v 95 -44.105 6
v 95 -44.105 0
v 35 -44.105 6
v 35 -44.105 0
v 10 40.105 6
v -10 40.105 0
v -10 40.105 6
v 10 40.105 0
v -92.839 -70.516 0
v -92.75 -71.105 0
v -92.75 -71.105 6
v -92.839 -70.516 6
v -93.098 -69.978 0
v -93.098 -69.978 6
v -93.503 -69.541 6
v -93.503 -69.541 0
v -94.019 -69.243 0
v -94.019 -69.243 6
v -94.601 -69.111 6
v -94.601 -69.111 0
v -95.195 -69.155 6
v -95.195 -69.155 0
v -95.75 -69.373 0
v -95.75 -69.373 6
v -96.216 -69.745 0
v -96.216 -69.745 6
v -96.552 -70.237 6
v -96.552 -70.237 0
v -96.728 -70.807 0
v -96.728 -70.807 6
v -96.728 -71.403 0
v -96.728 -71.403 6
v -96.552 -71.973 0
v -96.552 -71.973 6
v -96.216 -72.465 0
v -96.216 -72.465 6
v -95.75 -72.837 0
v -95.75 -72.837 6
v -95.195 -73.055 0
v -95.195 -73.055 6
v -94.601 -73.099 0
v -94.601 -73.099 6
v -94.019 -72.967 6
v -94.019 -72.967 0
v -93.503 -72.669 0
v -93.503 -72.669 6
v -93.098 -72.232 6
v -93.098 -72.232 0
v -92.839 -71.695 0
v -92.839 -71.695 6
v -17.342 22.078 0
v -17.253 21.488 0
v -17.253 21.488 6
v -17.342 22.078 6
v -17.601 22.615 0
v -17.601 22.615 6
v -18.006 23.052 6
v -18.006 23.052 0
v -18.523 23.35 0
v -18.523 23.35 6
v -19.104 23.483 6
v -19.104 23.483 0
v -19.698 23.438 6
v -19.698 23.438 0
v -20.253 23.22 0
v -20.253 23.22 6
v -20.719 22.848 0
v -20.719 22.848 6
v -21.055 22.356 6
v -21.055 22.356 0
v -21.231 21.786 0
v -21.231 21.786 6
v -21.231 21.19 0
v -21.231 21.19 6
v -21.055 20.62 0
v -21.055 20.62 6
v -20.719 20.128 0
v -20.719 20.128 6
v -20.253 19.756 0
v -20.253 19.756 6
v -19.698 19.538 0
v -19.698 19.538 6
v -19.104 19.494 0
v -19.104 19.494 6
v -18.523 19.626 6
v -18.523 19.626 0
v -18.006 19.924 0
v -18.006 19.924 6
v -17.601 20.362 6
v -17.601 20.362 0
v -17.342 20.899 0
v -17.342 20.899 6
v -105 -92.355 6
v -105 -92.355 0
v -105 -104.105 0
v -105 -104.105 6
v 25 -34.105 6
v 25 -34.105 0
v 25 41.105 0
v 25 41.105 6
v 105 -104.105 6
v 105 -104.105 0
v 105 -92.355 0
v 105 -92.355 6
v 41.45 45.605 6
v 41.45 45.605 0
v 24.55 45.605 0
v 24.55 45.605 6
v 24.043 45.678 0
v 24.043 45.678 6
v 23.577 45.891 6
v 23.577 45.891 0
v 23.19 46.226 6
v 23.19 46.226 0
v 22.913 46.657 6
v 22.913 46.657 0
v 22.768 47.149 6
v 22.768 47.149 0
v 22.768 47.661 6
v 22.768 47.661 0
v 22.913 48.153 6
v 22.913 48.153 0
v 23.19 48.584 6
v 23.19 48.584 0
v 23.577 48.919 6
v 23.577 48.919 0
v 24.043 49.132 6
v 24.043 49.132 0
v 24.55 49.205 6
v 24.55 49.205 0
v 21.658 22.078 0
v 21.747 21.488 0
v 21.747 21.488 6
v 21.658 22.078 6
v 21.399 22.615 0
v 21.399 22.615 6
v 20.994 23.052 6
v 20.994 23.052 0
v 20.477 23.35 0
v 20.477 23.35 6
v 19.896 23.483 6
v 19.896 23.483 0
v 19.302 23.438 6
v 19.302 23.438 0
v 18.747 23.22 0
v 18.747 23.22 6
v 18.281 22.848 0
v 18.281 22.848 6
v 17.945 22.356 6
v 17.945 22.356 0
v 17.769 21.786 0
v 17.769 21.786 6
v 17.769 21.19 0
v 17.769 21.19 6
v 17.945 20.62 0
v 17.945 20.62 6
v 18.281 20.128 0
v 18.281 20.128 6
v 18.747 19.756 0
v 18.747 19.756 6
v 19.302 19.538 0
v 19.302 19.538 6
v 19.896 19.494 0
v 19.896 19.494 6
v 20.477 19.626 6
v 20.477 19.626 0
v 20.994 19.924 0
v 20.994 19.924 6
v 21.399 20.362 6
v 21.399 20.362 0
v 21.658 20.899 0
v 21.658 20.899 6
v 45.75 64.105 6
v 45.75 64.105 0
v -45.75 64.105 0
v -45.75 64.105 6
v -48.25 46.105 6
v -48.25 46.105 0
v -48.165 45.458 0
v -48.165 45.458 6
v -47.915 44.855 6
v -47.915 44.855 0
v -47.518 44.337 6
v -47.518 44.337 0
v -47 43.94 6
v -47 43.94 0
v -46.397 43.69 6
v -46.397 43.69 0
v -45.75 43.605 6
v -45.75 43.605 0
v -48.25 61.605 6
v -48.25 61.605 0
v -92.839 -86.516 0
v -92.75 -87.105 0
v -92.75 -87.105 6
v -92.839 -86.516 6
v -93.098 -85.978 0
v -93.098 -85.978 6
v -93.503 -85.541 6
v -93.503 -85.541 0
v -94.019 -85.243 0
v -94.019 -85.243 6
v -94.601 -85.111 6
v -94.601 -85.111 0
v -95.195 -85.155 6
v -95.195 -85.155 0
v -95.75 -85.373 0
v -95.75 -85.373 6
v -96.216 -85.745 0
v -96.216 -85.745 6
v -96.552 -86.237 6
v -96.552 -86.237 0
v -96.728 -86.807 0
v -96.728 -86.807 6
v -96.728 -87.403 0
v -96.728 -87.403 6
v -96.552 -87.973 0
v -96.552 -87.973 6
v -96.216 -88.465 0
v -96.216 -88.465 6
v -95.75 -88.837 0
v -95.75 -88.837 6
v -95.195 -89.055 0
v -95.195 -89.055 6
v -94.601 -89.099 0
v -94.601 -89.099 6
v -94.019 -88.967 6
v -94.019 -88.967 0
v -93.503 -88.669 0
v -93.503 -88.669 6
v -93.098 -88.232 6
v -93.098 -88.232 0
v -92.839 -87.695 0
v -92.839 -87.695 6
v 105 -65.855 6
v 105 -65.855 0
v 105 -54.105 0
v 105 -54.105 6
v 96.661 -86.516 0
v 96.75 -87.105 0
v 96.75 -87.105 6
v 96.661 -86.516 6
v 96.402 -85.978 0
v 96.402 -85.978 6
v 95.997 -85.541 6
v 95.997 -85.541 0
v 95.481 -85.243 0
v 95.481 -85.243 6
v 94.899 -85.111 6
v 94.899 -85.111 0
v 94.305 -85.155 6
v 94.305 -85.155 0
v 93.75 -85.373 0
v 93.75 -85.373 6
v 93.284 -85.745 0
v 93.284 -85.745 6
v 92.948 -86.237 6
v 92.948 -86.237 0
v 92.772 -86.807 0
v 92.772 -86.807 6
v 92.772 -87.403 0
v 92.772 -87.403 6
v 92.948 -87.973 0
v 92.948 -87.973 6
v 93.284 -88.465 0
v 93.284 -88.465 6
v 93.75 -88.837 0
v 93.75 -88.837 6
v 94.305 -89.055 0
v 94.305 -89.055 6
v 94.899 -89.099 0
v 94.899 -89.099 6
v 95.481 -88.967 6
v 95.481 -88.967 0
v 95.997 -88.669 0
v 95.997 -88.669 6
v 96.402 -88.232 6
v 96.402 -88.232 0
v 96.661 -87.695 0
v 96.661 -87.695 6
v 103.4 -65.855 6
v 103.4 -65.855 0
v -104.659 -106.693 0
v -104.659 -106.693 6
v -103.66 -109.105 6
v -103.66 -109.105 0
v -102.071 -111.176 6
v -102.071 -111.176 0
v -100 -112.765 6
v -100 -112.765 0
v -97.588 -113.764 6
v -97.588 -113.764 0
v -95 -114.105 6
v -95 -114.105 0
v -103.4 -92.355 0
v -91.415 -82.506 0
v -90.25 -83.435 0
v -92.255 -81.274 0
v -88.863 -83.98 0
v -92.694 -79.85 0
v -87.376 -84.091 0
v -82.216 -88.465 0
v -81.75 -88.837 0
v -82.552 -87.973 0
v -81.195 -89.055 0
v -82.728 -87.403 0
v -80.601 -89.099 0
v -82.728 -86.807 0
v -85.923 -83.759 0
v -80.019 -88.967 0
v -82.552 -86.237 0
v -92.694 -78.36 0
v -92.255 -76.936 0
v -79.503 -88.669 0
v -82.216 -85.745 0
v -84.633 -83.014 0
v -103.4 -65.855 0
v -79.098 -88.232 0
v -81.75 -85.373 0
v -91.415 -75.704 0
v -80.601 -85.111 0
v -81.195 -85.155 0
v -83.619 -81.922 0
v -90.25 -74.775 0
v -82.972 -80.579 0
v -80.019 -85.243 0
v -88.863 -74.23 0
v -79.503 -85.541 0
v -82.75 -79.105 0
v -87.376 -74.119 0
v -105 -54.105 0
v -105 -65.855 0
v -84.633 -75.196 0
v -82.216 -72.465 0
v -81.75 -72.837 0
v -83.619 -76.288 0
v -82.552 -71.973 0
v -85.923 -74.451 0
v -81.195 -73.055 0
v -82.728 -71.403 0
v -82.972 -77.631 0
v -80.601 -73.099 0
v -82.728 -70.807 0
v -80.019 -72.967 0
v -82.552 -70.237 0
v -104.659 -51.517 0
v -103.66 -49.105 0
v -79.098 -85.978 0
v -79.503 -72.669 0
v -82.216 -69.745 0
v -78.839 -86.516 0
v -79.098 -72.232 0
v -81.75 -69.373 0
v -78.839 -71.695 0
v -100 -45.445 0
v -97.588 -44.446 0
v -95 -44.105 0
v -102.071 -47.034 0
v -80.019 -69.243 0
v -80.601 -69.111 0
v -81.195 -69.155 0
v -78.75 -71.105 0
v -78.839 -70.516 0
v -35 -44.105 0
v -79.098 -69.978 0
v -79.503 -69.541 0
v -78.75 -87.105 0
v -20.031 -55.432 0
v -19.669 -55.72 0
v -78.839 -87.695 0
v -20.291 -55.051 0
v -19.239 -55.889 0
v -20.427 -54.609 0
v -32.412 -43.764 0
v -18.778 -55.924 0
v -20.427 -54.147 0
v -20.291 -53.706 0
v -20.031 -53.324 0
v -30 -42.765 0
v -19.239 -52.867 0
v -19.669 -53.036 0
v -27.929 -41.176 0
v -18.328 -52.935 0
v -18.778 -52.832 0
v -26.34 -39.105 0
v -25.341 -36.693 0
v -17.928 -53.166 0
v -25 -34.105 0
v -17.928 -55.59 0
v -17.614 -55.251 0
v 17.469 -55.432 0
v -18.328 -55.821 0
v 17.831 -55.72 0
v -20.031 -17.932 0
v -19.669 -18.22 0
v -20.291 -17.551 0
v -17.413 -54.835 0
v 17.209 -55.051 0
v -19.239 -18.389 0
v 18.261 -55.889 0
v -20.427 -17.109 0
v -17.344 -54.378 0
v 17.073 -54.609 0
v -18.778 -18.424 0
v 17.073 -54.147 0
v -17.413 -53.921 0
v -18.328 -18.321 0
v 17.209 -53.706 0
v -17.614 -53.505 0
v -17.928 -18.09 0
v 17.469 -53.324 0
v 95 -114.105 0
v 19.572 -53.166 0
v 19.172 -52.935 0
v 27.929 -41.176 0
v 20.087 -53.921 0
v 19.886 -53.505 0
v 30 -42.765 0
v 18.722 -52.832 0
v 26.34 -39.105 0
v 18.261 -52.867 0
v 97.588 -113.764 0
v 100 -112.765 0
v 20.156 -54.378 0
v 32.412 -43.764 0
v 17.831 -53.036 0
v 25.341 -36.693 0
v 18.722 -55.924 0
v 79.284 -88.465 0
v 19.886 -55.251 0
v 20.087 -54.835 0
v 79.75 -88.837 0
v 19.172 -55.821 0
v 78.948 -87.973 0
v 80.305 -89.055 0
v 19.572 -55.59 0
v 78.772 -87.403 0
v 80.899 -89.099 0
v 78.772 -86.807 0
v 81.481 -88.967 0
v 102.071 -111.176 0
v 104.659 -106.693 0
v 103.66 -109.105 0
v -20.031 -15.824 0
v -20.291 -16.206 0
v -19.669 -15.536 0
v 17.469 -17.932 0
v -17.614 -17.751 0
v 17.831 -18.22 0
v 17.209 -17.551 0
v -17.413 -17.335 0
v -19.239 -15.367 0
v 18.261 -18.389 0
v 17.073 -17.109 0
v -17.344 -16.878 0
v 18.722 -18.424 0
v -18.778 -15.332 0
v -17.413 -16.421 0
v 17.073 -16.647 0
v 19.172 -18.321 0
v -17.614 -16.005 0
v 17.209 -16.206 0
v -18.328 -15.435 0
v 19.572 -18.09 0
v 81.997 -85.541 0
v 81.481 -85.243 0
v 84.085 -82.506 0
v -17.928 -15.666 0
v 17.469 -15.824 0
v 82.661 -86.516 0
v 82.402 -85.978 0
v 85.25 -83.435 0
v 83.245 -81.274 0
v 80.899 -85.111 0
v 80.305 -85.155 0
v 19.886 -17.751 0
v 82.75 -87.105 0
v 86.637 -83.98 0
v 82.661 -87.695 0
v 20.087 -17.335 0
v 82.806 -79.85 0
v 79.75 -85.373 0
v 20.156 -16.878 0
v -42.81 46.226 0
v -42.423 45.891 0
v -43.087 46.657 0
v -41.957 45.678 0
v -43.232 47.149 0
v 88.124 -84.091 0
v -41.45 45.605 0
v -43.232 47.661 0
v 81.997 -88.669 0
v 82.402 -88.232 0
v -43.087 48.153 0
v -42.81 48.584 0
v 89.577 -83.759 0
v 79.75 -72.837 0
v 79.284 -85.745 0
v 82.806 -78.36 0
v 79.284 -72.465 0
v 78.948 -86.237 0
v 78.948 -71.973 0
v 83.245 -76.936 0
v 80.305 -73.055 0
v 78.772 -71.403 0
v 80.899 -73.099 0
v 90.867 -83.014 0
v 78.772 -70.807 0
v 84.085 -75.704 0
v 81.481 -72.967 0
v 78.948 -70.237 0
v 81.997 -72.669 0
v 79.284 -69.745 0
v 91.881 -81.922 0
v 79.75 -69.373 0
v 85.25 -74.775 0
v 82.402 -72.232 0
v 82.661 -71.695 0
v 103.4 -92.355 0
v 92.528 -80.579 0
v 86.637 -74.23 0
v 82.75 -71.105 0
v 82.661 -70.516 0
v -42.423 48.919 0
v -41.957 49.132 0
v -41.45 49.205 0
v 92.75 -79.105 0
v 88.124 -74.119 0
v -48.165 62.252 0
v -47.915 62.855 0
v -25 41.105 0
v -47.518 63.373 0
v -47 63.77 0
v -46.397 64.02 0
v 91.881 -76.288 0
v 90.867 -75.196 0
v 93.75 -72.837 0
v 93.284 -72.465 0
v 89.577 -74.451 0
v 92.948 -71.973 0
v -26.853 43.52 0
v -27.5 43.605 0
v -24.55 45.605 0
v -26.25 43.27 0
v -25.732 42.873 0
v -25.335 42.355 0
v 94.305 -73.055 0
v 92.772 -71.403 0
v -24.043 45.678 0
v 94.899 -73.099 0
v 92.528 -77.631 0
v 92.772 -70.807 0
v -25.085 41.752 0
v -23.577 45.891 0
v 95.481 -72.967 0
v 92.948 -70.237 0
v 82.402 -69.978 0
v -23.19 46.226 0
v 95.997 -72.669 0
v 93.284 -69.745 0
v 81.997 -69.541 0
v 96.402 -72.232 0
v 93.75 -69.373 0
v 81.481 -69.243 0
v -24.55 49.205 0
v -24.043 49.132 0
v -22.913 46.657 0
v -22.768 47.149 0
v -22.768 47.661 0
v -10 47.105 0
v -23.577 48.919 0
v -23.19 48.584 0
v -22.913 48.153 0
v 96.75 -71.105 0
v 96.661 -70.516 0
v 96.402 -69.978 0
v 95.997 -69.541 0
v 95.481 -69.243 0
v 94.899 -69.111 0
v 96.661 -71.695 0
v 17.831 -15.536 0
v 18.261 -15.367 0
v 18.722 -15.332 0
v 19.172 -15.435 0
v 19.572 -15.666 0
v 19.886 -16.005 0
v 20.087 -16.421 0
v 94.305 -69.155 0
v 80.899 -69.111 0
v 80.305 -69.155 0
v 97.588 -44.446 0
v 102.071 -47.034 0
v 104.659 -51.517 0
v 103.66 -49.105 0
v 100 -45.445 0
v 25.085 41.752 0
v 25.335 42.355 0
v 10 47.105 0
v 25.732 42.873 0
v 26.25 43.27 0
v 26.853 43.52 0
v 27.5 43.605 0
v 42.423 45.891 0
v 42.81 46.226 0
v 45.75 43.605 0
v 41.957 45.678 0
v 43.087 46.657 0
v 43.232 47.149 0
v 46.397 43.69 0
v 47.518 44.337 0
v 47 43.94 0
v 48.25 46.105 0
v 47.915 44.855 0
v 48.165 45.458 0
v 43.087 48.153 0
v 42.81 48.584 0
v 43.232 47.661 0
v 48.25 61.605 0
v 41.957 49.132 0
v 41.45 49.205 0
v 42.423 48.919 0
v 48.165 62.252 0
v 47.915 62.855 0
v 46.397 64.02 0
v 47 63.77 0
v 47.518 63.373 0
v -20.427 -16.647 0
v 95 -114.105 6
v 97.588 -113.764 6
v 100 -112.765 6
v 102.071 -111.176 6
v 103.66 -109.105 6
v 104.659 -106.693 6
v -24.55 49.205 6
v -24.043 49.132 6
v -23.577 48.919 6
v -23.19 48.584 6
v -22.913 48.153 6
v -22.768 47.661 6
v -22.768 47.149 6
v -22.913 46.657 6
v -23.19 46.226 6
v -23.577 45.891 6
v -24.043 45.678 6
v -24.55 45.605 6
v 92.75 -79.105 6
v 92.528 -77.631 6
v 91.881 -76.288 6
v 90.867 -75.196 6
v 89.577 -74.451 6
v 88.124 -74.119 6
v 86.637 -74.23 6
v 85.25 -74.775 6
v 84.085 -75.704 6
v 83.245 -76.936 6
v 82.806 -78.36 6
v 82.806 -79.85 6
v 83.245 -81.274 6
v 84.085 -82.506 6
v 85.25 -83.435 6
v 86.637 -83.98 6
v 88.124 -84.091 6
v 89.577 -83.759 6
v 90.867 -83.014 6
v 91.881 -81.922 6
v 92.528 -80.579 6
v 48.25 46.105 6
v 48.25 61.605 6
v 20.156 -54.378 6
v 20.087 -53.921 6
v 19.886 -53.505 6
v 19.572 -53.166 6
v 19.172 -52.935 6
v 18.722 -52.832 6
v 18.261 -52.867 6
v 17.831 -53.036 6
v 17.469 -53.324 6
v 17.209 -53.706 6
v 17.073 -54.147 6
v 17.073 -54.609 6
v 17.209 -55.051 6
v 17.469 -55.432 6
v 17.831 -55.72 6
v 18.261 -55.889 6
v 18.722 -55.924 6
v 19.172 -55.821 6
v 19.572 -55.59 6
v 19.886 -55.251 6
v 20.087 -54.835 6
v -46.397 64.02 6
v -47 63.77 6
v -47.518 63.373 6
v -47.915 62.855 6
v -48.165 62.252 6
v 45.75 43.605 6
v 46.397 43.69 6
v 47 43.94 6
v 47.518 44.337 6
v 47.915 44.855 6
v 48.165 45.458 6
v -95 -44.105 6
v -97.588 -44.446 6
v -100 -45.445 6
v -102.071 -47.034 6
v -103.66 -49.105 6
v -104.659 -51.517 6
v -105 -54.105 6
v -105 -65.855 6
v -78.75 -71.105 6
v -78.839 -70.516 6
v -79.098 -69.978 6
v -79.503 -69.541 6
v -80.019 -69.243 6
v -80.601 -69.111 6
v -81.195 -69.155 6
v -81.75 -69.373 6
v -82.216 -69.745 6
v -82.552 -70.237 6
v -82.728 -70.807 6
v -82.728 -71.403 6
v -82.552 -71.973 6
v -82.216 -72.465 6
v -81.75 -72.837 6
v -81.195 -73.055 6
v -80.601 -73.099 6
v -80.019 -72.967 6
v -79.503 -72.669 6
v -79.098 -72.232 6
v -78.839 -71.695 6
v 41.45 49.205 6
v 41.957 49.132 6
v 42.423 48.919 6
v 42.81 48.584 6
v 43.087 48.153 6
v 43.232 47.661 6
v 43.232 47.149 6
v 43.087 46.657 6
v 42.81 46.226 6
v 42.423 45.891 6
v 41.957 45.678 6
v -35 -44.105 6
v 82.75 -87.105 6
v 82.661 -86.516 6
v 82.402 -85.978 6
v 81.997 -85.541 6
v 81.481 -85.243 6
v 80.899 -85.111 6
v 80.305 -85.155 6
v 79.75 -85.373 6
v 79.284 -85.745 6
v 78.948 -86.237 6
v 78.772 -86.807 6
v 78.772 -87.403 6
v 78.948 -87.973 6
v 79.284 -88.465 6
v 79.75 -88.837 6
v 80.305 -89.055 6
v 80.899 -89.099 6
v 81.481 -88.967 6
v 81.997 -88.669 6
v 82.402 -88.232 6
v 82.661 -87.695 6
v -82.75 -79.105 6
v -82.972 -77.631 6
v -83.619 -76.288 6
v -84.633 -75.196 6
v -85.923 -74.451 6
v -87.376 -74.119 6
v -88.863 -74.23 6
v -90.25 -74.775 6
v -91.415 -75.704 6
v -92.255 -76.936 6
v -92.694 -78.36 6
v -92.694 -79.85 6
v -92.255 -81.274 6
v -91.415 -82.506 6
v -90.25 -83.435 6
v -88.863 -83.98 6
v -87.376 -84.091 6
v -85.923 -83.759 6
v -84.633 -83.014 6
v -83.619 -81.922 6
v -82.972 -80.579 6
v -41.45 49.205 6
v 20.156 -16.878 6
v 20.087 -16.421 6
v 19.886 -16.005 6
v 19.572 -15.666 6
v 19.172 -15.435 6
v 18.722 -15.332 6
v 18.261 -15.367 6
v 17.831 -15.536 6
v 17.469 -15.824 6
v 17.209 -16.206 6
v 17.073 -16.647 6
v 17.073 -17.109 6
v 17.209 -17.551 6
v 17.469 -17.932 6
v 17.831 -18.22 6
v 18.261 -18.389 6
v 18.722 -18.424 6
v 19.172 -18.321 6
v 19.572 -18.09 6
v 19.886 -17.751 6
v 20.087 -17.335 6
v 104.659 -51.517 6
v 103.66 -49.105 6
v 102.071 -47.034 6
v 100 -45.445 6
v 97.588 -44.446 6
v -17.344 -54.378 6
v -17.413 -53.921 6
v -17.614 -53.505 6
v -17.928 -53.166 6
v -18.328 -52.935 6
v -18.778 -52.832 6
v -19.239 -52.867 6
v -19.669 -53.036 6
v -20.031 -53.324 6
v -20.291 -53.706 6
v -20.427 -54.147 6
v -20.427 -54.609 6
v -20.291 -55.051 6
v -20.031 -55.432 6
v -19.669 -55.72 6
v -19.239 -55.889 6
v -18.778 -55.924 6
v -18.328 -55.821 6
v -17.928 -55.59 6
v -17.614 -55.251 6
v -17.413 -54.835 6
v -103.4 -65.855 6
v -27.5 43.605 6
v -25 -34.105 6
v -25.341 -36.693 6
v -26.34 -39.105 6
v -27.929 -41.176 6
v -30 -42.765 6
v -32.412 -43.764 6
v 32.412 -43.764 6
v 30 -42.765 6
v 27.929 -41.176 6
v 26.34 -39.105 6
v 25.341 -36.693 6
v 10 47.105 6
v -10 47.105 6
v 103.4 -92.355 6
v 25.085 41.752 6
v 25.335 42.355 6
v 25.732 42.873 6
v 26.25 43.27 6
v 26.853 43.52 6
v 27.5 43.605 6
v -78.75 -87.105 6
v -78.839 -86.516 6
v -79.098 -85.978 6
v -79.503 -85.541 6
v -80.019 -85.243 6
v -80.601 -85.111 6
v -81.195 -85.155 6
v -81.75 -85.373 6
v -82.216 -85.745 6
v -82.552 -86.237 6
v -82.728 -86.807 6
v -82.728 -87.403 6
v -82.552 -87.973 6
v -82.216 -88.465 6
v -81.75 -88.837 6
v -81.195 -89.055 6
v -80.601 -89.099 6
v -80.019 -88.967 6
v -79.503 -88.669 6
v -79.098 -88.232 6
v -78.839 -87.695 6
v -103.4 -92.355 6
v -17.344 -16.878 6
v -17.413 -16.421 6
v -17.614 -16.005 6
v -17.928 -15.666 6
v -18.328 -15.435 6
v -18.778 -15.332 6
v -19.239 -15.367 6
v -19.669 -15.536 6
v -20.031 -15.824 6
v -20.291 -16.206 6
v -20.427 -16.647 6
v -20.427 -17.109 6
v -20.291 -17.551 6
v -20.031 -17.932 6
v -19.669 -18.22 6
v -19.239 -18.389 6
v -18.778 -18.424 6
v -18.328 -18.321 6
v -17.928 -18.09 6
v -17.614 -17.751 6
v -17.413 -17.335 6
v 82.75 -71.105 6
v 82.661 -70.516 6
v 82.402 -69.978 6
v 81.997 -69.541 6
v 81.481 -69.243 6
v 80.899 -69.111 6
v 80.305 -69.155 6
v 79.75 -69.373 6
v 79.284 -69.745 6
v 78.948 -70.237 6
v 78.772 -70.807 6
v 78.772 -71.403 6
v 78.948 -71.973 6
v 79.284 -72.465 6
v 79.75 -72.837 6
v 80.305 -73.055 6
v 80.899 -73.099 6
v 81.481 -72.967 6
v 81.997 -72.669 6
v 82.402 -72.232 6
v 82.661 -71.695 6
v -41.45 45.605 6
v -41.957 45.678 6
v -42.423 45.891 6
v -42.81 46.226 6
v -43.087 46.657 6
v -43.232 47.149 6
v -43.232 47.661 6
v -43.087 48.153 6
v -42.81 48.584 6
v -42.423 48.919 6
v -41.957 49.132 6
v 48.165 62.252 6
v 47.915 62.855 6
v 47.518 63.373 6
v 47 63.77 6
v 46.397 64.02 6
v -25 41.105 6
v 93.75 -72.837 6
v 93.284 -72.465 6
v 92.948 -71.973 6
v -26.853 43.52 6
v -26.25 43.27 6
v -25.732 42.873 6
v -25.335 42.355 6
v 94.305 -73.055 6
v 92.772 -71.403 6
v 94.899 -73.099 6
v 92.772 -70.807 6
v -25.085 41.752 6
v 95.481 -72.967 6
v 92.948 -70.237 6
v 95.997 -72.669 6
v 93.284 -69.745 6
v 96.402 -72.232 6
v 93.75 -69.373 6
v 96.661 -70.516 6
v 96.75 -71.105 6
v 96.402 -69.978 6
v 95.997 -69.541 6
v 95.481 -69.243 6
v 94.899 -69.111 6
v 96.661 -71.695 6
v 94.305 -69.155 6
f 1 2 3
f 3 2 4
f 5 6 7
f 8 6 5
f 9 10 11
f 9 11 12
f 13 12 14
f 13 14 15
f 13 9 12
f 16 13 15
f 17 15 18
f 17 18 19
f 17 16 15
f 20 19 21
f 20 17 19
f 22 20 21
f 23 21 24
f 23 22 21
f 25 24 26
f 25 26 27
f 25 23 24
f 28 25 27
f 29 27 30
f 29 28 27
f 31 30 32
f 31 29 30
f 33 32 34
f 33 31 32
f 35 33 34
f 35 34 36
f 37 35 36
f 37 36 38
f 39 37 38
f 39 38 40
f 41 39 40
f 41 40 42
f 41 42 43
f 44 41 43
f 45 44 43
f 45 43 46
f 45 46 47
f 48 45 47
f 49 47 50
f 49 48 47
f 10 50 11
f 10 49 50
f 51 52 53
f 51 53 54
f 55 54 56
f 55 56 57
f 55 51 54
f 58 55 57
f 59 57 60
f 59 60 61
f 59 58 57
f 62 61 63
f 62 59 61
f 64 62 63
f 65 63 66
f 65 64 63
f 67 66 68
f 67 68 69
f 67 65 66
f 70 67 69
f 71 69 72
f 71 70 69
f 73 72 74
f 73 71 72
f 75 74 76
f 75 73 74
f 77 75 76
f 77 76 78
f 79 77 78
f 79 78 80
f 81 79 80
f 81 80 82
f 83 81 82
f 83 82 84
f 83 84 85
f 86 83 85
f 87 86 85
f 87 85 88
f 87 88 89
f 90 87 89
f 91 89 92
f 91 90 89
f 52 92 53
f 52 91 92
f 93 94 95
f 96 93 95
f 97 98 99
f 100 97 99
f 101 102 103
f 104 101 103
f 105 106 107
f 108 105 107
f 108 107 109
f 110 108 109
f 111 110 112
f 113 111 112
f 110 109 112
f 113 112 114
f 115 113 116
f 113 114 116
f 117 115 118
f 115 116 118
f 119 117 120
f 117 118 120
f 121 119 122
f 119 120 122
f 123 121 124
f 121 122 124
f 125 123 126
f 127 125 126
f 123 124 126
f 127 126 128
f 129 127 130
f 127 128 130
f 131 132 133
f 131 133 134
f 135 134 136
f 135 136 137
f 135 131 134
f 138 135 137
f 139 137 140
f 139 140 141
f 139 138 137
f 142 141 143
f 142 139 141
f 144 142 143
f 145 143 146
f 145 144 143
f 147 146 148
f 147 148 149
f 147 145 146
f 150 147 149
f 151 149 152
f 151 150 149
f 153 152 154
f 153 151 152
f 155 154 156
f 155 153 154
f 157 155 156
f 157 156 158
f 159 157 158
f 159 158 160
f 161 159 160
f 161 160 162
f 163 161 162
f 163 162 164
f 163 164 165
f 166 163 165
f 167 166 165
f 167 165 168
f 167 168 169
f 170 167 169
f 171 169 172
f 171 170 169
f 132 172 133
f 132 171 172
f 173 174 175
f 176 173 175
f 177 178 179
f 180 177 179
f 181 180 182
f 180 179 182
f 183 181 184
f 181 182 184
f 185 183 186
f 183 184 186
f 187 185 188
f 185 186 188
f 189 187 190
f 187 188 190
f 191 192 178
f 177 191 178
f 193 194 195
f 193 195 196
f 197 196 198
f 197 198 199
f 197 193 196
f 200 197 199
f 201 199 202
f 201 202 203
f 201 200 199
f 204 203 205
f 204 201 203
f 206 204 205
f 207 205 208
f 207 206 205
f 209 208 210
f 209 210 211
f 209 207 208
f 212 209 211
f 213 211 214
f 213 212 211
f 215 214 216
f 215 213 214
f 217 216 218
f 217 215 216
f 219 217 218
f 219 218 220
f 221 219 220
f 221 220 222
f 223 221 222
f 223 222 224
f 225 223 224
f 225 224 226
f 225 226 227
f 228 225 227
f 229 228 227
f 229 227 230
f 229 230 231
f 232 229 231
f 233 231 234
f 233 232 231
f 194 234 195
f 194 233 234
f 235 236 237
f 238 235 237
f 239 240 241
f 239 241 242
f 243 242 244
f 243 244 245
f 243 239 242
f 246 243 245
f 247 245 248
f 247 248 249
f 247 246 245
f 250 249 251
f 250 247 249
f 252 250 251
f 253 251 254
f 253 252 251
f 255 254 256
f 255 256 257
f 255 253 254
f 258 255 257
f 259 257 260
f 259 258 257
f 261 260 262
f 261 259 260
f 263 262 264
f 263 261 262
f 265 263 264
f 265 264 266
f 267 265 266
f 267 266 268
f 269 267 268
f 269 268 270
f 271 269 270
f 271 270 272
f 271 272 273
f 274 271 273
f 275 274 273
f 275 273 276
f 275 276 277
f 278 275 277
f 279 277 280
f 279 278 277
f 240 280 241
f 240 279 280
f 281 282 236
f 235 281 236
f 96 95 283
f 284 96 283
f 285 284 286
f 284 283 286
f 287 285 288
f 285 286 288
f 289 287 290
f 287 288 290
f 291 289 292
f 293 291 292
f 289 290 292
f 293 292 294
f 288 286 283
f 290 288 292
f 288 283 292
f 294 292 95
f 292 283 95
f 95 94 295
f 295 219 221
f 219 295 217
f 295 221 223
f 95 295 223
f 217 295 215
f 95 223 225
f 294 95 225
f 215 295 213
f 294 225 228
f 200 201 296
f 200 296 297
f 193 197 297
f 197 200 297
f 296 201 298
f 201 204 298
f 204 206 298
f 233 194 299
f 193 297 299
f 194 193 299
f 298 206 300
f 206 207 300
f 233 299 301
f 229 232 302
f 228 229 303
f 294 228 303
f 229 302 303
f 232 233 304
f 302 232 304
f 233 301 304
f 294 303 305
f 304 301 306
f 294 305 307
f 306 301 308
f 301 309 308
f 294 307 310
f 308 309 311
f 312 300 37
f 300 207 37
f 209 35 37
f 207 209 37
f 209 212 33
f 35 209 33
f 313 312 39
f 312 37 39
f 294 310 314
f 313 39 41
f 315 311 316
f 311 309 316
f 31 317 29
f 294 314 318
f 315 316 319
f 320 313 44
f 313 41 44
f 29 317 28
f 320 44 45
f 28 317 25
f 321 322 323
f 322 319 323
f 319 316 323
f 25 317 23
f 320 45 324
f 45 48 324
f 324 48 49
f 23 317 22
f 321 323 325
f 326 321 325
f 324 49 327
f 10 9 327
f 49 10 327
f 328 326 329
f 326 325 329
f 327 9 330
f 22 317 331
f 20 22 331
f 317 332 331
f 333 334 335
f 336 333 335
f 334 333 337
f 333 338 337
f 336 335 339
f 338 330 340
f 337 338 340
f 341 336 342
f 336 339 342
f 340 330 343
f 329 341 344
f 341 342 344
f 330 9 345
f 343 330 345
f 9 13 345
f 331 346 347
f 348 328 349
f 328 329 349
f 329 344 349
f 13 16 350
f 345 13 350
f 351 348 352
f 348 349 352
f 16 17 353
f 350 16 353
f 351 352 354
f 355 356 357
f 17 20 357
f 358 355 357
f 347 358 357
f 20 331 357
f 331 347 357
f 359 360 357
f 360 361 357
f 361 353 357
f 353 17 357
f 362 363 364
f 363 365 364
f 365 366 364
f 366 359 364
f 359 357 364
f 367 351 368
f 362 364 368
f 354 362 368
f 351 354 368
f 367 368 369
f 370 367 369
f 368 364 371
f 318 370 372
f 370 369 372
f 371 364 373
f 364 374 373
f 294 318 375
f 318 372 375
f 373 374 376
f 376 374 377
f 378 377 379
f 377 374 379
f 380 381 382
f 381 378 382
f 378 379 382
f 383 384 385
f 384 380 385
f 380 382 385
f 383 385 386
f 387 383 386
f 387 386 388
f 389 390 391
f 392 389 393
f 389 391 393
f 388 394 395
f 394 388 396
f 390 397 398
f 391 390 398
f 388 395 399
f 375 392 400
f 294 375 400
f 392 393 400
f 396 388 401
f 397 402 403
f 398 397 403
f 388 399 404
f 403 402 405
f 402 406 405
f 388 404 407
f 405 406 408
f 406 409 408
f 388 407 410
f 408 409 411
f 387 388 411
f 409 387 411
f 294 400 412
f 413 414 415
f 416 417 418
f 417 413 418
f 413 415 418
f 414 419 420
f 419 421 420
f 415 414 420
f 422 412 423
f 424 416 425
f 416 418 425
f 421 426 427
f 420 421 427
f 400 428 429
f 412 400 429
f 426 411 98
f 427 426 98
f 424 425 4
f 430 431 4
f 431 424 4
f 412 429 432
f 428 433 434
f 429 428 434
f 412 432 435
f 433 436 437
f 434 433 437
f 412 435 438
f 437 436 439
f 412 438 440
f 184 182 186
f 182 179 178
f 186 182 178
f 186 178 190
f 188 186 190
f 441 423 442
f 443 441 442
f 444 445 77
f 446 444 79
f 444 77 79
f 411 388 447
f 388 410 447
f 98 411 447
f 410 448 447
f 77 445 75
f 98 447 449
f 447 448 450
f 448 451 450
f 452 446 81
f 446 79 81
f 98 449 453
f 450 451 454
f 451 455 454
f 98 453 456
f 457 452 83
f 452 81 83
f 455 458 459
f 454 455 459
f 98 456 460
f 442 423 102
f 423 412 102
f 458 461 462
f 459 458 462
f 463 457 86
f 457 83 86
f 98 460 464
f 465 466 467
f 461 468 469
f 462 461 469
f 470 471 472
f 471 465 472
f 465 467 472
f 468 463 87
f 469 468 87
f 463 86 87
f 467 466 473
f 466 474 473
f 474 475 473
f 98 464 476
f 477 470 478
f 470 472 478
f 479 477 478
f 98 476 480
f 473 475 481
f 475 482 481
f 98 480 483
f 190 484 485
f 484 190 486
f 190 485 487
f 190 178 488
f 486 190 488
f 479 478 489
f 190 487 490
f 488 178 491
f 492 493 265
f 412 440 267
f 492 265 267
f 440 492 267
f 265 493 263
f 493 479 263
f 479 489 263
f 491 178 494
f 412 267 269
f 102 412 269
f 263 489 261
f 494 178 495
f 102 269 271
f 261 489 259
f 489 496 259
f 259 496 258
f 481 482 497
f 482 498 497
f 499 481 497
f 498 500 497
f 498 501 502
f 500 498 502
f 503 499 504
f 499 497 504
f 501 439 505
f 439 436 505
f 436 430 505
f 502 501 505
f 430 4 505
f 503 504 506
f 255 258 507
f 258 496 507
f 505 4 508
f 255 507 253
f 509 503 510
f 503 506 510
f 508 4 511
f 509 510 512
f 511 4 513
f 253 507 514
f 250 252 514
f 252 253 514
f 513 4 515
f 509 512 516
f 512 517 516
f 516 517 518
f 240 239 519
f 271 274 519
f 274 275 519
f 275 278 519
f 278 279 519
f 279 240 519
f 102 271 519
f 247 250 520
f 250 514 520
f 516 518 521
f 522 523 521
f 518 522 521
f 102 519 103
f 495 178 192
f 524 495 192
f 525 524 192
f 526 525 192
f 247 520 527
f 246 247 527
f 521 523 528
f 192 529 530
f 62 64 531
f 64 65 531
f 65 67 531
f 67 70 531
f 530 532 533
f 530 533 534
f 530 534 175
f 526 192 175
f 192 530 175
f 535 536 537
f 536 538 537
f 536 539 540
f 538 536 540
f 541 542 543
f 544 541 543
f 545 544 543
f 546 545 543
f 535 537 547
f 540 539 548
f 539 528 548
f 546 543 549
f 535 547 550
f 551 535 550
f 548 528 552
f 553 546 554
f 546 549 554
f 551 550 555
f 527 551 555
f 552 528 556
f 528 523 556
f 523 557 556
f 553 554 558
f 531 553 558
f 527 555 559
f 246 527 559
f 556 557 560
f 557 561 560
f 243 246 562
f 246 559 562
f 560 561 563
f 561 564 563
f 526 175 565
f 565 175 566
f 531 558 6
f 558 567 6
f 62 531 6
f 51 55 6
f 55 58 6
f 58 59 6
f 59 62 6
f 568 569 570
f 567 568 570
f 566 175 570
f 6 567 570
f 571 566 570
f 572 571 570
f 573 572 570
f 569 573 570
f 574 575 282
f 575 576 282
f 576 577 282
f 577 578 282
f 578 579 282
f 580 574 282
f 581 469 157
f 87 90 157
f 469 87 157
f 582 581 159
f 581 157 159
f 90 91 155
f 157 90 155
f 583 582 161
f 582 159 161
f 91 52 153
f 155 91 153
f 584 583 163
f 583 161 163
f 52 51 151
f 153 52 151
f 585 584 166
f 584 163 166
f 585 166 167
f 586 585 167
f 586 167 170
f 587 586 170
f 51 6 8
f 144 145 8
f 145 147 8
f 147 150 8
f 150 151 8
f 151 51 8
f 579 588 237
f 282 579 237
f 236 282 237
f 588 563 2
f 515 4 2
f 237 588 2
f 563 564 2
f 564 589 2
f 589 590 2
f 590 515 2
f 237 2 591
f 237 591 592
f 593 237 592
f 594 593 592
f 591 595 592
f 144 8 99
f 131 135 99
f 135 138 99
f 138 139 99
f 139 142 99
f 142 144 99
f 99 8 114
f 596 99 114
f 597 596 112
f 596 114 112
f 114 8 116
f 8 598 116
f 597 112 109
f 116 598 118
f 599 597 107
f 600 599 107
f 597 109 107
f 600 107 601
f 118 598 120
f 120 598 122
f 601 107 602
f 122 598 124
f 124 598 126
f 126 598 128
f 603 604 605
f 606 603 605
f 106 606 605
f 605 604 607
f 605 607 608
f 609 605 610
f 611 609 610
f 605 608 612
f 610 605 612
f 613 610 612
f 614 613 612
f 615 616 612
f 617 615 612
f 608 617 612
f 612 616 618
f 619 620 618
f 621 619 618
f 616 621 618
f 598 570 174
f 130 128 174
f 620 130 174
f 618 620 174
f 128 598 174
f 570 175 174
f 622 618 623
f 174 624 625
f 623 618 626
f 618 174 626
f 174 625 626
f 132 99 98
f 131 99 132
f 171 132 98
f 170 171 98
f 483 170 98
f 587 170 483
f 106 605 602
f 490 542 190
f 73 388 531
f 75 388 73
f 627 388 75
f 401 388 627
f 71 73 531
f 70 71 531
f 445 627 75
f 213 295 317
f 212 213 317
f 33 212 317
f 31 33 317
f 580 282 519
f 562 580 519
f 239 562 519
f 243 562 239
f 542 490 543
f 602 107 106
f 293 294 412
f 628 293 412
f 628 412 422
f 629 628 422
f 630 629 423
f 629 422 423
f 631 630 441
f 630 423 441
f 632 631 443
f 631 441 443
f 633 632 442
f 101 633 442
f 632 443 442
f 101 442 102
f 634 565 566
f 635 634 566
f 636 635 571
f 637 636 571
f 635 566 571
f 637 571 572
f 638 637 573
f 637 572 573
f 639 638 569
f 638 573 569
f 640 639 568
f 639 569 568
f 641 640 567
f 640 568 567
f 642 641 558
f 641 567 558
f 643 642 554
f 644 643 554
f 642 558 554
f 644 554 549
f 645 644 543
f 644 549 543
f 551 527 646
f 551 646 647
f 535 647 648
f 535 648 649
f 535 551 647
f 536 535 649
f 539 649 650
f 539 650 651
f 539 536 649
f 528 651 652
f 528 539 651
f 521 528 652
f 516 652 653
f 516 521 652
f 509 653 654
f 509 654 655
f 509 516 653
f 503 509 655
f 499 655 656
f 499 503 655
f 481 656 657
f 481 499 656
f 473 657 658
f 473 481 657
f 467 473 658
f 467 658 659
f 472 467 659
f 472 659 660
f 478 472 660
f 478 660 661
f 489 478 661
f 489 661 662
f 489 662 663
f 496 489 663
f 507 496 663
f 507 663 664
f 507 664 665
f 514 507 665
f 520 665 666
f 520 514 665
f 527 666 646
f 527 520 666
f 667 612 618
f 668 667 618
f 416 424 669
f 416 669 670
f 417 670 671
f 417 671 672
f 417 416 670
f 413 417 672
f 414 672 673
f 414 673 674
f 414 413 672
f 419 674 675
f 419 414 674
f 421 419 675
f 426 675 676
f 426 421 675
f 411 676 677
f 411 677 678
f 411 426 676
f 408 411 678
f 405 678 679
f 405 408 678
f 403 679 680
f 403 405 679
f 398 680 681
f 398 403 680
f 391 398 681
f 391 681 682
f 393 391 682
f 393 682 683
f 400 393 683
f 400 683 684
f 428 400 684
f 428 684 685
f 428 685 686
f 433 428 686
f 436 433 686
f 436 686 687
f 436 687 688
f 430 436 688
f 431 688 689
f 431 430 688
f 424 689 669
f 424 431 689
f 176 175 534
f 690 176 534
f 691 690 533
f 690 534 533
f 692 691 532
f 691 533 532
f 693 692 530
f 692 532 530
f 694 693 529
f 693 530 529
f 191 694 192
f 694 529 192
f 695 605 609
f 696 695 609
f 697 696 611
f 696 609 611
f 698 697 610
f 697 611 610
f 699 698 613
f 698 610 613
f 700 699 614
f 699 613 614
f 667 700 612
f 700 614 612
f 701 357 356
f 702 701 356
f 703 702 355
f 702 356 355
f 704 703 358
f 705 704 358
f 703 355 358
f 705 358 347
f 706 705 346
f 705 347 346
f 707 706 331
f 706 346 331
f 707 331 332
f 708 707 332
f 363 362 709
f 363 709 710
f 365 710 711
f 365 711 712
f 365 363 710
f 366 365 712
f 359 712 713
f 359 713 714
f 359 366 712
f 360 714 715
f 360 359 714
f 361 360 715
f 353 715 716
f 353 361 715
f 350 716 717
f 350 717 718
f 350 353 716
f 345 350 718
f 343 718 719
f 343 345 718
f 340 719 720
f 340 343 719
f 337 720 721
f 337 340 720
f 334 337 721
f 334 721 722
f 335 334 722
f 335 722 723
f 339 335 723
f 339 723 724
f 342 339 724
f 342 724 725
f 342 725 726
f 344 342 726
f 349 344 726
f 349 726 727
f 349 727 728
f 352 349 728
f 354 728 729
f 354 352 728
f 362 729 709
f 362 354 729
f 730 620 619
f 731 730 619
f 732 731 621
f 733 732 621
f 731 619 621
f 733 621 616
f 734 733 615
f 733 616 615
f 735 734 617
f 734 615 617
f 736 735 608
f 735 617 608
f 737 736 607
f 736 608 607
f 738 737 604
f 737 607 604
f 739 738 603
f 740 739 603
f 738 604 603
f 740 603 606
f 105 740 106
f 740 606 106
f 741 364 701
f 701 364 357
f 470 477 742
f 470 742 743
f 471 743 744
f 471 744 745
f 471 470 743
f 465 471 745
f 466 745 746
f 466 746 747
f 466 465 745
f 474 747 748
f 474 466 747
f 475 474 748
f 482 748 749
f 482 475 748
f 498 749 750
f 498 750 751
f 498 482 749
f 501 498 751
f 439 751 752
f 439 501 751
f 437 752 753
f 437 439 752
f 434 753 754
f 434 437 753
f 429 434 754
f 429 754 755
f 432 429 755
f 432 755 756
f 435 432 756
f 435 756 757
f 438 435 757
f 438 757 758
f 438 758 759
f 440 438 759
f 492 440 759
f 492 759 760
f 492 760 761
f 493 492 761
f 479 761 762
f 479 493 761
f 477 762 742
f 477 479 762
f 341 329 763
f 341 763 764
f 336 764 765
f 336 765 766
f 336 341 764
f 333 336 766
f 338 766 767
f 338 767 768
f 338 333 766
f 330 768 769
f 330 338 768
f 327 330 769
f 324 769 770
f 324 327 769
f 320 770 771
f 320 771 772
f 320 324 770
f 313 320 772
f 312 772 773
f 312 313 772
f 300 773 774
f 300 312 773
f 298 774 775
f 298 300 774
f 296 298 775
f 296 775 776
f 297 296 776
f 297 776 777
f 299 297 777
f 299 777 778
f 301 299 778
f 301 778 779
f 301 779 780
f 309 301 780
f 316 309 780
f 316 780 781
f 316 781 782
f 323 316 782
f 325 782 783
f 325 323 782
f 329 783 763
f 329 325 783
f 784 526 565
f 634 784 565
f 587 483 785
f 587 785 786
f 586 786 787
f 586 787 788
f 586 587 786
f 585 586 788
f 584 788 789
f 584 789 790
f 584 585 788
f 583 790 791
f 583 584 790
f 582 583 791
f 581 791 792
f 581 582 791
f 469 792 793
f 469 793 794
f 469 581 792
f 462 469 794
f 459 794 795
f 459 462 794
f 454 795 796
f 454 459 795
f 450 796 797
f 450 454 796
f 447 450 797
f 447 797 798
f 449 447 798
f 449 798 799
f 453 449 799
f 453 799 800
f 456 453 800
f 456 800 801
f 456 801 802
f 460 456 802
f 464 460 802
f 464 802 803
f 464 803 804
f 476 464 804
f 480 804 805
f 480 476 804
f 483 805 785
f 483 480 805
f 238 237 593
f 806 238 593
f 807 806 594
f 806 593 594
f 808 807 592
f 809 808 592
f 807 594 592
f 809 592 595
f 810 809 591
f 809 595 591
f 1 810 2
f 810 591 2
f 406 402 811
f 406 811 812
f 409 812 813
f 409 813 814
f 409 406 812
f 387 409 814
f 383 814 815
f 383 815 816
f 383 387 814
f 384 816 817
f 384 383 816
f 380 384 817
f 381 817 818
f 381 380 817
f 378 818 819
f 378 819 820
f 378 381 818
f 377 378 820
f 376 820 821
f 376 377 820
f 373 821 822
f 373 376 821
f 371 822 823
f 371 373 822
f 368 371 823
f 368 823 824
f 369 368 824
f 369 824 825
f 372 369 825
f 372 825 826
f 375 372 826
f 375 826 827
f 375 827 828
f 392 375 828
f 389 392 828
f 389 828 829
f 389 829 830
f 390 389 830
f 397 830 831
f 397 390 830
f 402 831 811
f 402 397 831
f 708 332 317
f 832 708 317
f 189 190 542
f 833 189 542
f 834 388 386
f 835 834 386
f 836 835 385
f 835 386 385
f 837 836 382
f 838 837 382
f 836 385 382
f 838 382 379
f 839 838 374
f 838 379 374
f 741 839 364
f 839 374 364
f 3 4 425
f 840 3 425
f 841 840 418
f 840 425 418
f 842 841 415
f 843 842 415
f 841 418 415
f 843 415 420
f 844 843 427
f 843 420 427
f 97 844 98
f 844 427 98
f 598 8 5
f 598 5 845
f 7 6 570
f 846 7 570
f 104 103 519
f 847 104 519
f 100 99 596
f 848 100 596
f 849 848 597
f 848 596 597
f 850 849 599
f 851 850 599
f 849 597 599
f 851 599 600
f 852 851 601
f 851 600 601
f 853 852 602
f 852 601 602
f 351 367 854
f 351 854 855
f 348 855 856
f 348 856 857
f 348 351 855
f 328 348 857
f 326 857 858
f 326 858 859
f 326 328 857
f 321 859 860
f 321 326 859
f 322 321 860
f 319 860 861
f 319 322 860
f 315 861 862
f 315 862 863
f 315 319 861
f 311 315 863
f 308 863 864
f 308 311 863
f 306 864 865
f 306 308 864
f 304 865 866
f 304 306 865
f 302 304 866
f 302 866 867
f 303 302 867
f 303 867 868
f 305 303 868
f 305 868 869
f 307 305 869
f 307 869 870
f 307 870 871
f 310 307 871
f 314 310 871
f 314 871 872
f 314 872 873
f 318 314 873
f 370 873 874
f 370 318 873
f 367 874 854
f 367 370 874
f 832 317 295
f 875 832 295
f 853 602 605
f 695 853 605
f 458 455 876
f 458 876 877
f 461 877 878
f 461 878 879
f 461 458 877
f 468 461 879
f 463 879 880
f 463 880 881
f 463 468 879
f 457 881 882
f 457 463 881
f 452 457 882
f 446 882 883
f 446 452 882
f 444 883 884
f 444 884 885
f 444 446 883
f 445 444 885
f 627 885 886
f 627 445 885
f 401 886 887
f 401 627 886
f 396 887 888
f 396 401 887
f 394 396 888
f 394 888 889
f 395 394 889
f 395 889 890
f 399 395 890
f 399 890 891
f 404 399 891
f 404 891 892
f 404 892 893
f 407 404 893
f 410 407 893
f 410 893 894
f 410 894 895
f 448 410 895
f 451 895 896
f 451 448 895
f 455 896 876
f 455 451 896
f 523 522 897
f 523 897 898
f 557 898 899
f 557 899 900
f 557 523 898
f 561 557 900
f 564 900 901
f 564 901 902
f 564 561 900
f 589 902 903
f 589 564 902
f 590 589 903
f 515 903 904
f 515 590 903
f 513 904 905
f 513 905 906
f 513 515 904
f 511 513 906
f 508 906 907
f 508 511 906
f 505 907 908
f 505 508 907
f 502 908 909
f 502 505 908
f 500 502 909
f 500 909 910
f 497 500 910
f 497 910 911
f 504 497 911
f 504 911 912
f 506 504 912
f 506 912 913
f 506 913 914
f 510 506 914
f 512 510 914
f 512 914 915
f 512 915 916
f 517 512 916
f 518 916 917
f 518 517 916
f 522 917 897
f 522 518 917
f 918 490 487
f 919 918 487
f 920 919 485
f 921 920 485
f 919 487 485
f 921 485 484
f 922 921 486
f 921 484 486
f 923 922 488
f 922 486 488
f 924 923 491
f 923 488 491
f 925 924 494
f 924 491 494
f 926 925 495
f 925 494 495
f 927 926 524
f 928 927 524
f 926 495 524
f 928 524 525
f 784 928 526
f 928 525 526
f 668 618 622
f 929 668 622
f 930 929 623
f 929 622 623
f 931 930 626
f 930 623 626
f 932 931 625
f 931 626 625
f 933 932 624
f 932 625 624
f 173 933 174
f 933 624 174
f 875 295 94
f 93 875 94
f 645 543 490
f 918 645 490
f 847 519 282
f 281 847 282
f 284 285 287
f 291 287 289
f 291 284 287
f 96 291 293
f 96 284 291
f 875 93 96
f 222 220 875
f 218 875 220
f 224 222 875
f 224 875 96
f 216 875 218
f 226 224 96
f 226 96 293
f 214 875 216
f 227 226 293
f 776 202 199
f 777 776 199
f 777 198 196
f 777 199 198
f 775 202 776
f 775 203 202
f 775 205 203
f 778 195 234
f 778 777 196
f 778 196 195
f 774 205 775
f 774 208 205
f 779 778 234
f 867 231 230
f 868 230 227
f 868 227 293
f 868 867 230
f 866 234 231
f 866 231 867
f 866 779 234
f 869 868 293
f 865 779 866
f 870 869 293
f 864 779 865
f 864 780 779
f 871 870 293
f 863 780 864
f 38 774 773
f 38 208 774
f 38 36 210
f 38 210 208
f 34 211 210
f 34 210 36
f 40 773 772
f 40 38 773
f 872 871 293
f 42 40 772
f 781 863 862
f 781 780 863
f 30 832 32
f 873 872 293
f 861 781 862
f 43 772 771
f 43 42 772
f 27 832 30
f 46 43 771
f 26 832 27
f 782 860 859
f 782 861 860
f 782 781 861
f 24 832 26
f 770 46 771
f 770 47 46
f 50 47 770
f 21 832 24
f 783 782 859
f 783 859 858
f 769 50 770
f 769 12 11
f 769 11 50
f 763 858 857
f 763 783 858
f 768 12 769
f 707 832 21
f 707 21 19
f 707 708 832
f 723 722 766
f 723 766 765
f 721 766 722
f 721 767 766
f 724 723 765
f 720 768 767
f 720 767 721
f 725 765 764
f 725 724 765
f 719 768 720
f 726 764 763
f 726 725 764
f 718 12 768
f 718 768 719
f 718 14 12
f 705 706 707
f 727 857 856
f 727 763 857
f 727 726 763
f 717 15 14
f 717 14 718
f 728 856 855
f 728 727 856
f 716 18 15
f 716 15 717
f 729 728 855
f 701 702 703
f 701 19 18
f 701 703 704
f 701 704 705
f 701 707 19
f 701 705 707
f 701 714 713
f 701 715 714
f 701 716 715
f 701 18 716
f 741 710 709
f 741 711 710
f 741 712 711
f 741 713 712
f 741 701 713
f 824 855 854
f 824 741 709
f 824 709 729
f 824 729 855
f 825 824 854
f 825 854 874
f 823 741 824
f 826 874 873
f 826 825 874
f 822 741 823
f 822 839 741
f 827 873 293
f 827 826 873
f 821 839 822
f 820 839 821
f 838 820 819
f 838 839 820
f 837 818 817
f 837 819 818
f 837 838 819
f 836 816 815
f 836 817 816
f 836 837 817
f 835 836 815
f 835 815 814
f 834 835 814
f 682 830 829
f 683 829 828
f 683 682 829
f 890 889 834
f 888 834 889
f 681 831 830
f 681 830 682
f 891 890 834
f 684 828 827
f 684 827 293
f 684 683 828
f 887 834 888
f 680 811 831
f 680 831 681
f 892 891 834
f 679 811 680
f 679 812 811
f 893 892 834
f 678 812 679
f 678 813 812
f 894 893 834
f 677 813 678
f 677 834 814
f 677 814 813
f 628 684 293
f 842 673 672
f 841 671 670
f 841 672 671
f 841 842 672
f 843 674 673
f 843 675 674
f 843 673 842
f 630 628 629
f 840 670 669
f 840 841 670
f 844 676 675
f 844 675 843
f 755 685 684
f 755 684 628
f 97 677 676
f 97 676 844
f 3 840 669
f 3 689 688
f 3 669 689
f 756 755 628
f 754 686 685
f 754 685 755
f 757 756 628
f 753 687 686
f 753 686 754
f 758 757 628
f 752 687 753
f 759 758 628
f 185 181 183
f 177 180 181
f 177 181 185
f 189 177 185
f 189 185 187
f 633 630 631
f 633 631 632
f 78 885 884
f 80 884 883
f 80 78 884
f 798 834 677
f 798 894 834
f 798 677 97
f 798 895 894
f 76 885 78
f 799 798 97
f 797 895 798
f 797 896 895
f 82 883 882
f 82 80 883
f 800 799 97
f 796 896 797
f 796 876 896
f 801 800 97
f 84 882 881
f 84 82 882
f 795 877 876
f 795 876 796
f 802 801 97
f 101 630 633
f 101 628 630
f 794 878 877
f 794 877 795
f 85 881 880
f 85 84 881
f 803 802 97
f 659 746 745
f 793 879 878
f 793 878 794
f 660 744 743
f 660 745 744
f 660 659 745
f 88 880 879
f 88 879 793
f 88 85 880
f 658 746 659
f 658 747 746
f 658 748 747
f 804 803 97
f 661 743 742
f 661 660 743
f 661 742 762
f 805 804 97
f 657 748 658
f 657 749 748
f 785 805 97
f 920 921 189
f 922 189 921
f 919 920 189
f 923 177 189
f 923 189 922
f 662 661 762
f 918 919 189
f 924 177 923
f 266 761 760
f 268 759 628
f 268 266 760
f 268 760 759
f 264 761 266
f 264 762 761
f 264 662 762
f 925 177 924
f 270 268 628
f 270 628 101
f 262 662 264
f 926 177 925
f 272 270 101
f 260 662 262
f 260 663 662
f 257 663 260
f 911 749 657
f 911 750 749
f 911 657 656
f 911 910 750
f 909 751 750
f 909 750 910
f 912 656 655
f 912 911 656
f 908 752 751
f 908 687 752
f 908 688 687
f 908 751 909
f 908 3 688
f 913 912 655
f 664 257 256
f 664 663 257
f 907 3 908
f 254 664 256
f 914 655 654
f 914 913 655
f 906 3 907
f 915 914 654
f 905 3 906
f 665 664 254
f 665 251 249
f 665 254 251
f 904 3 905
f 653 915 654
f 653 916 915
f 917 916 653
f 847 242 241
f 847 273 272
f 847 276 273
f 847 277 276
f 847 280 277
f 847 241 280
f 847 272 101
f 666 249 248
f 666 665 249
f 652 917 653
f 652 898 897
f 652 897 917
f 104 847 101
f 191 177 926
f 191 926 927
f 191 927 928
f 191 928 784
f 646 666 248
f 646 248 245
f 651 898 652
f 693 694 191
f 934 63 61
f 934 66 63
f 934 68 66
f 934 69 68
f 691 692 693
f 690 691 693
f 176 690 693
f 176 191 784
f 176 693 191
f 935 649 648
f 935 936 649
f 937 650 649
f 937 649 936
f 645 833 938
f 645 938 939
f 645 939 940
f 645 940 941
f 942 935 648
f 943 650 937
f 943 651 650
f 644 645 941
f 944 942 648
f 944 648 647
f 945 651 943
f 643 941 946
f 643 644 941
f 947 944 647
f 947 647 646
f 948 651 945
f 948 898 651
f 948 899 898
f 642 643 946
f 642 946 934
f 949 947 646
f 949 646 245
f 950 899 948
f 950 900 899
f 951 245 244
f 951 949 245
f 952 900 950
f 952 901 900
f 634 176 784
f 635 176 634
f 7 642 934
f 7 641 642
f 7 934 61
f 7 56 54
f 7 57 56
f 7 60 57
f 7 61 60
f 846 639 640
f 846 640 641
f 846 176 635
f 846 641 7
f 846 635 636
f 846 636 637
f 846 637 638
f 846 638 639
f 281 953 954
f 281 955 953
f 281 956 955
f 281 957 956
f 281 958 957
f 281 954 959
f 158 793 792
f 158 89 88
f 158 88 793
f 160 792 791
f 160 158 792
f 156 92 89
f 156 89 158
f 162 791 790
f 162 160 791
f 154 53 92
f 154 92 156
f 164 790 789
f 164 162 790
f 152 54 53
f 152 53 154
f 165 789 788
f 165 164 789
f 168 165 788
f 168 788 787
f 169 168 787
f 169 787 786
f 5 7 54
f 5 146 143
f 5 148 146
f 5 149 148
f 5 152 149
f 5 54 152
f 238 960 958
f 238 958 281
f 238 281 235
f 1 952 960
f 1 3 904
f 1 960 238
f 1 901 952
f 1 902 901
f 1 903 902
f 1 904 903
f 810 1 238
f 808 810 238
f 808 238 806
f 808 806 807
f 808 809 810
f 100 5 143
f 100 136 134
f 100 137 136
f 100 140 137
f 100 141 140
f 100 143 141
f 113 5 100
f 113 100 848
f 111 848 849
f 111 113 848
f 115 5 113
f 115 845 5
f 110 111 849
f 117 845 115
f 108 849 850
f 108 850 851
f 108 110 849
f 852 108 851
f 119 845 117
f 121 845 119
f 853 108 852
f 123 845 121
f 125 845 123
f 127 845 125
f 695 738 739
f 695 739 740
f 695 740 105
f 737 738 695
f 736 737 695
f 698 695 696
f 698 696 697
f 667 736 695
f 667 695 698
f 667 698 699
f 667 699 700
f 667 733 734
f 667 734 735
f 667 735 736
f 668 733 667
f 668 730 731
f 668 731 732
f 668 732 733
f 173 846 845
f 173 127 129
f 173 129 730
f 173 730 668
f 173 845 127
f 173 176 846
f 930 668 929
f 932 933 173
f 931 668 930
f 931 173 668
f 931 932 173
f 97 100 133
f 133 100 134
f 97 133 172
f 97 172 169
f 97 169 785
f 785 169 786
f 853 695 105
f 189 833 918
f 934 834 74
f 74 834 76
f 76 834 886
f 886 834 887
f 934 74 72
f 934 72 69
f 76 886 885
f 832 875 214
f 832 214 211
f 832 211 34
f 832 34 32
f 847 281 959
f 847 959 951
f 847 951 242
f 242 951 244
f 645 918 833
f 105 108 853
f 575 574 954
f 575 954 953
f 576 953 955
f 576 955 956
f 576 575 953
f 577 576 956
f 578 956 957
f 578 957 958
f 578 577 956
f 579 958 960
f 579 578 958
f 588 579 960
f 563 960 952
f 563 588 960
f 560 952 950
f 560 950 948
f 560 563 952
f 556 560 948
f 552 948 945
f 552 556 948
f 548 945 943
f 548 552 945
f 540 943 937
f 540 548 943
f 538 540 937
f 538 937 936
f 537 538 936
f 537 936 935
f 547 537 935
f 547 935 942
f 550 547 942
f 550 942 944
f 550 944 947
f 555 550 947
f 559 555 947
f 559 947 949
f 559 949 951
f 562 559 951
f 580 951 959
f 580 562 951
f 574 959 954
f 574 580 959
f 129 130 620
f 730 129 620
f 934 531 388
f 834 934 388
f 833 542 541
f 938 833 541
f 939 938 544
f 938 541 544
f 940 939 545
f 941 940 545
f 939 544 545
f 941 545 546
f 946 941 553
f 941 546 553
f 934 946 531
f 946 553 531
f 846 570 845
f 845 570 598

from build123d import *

# Parameters (mm, degrees)
SKETCH1_R           = 2
SKETCH1_R_2         = 5
SKETCH1_R_3         = 1.55
SKETCH1_W           = 20
SKETCH1_H           = 7
BOSS_EXTRUDE1_DEPTH = 6


with BuildPart() as part:
    # Sketch1 → Boss-Extrude1 (new body)
    with BuildSketch(Plane.XY):
        with BuildLine():
            Line((95, -44.105037838), (35, -44.105037838))
            ThreePointArc((35, -44.105037838), (27.928932188, -41.17610565), (25, -34.105037838))
            Line((25, -34.105037838), (25, 41.105037842))
            ThreePointArc((25, 41.105037842), (25.732233047, 42.872804795), (27.5, 43.605037842))
            Line((27.5, 43.605037842), (45.75, 43.605037842))
            ThreePointArc((45.75, 43.605037842), (47.517766953, 44.337270889), (48.25, 46.105037842))
            Line((48.25, 46.105037842), (48.25, 61.605037842))
            ThreePointArc((48.25, 61.605037842), (47.517766953, 63.372804795), (45.75, 64.105037842))
            Line((45.75, 64.105037842), (-45.75, 64.105037842))
            ThreePointArc((-45.75, 64.105037842), (-47.517766953, 63.372804795), (-48.25, 61.605037842))
            Line((-48.25, 61.605037842), (-48.25, 46.105037842))
            ThreePointArc((-48.25, 46.105037842), (-47.517766953, 44.337270889), (-45.75, 43.605037842))
            Line((-45.75, 43.605037842), (-27.5, 43.605037842))
            ThreePointArc((-27.5, 43.605037842), (-25.732233047, 42.872804795), (-25, 41.105037842))
            Line((-25, 41.105037842), (-25, -34.105037838))
            ThreePointArc((-25, -34.105037838), (-27.928932188, -41.17610565), (-35, -44.105037838))
            Line((-35, -44.105037838), (-95, -44.105037838))
            ThreePointArc((-95, -44.105037838), (-102.071067812, -47.033970026), (-105, -54.105037838))
            Line((-105, -54.105037838), (-105, -65.855037838))
            Line((-105, -65.855037838), (-103.4, -65.855037838))
            Line((-103.4, -65.855037838), (-103.4, -92.355037838))
            Line((-103.4, -92.355037838), (-105, -92.355037838))
            Line((-105, -92.355037838), (-105, -104.105037838))
            ThreePointArc((-105, -104.105037838), (-102.071067812, -111.17610565), (-95, -114.105037838))
            Line((-95, -114.105037838), (95, -114.105037838))
            ThreePointArc((95, -114.105037838), (102.071067812, -111.17610565), (105, -104.105037838))
            Line((105, -104.105037838), (105, -92.355037838))
            Line((105, -92.355037838), (103.4, -92.355037838))
            Line((103.4, -92.355037838), (103.4, -65.855037838))
            Line((103.4, -65.855037838), (105, -65.855037838))
            Line((105, -65.855037838), (105, -54.105037838))
            ThreePointArc((105, -54.105037838), (102.071067812, -47.033970026), (95, -44.105037838))
        make_face()
        with Locations((80.75, -87.105037838)):
            Circle(SKETCH1_R, mode=Mode.SUBTRACT)
        with Locations((87.75, -79.105037838)):
            Circle(SKETCH1_R_2, mode=Mode.SUBTRACT)
        with Locations((94.75, -71.105037838)):
            Circle(SKETCH1_R, mode=Mode.SUBTRACT)
        with Locations((80.75, -71.105037838)):
            Circle(SKETCH1_R, mode=Mode.SUBTRACT)
        with Locations((-80.75, -71.105037838)):
            Circle(SKETCH1_R, mode=Mode.SUBTRACT)
        with Locations((-94.75, -71.105037838)):
            Circle(SKETCH1_R, mode=Mode.SUBTRACT)
        with Locations((-87.75, -79.105037838)):
            Circle(SKETCH1_R_2, mode=Mode.SUBTRACT)
        with Locations((-80.75, -87.105037838)):
            Circle(SKETCH1_R, mode=Mode.SUBTRACT)
        with Locations((-18.894331083, -54.378109012)):
            Circle(SKETCH1_R_3, mode=Mode.SUBTRACT)
        with Locations((18.605668917, -16.878109012)):
            Circle(SKETCH1_R_3, mode=Mode.SUBTRACT)
        with Locations((-18.894331083, -16.878109012)):
            Circle(SKETCH1_R_3, mode=Mode.SUBTRACT)
        with Locations((18.605668917, -54.378109012)):
            Circle(SKETCH1_R_3, mode=Mode.SUBTRACT)
        with Locations((19.746744501, 21.488147141)):
            Circle(SKETCH1_R, mode=Mode.SUBTRACT)
        with Locations((-19.253255499, 21.488147141)):
            Circle(SKETCH1_R, mode=Mode.SUBTRACT)
        with Locations((-94.75, -87.105037838)):
            Circle(SKETCH1_R, mode=Mode.SUBTRACT)
        with Locations((94.75, -87.105037838)):
            Circle(SKETCH1_R, mode=Mode.SUBTRACT)
        with BuildLine():
            Line((-41.45, 49.205037842), (-24.55, 49.205037842))
            ThreePointArc((-24.55, 49.205037842), (-22.75, 47.405037842), (-24.55, 45.605037842))
            Line((-24.55, 45.605037842), (-41.45, 45.605037842))
            ThreePointArc((-41.45, 45.605037842), (-43.25, 47.405037842), (-41.45, 49.205037842))
        make_face(mode=Mode.SUBTRACT)
        with BuildLine():
            Line((41.45, 45.605037842), (24.55, 45.605037842))
            ThreePointArc((24.55, 45.605037842), (22.75, 47.405037842), (24.55, 49.205037842))
            Line((24.55, 49.205037842), (41.45, 49.205037842))
            ThreePointArc((41.45, 49.205037842), (43.25, 47.405037842), (41.45, 45.605037842))
        make_face(mode=Mode.SUBTRACT)
        with Locations((0, 43.605037842)):
            Rectangle(SKETCH1_W, SKETCH1_H, mode=Mode.SUBTRACT)
    extrude(amount=BOSS_EXTRUDE1_DEPTH)


solid = part.part
